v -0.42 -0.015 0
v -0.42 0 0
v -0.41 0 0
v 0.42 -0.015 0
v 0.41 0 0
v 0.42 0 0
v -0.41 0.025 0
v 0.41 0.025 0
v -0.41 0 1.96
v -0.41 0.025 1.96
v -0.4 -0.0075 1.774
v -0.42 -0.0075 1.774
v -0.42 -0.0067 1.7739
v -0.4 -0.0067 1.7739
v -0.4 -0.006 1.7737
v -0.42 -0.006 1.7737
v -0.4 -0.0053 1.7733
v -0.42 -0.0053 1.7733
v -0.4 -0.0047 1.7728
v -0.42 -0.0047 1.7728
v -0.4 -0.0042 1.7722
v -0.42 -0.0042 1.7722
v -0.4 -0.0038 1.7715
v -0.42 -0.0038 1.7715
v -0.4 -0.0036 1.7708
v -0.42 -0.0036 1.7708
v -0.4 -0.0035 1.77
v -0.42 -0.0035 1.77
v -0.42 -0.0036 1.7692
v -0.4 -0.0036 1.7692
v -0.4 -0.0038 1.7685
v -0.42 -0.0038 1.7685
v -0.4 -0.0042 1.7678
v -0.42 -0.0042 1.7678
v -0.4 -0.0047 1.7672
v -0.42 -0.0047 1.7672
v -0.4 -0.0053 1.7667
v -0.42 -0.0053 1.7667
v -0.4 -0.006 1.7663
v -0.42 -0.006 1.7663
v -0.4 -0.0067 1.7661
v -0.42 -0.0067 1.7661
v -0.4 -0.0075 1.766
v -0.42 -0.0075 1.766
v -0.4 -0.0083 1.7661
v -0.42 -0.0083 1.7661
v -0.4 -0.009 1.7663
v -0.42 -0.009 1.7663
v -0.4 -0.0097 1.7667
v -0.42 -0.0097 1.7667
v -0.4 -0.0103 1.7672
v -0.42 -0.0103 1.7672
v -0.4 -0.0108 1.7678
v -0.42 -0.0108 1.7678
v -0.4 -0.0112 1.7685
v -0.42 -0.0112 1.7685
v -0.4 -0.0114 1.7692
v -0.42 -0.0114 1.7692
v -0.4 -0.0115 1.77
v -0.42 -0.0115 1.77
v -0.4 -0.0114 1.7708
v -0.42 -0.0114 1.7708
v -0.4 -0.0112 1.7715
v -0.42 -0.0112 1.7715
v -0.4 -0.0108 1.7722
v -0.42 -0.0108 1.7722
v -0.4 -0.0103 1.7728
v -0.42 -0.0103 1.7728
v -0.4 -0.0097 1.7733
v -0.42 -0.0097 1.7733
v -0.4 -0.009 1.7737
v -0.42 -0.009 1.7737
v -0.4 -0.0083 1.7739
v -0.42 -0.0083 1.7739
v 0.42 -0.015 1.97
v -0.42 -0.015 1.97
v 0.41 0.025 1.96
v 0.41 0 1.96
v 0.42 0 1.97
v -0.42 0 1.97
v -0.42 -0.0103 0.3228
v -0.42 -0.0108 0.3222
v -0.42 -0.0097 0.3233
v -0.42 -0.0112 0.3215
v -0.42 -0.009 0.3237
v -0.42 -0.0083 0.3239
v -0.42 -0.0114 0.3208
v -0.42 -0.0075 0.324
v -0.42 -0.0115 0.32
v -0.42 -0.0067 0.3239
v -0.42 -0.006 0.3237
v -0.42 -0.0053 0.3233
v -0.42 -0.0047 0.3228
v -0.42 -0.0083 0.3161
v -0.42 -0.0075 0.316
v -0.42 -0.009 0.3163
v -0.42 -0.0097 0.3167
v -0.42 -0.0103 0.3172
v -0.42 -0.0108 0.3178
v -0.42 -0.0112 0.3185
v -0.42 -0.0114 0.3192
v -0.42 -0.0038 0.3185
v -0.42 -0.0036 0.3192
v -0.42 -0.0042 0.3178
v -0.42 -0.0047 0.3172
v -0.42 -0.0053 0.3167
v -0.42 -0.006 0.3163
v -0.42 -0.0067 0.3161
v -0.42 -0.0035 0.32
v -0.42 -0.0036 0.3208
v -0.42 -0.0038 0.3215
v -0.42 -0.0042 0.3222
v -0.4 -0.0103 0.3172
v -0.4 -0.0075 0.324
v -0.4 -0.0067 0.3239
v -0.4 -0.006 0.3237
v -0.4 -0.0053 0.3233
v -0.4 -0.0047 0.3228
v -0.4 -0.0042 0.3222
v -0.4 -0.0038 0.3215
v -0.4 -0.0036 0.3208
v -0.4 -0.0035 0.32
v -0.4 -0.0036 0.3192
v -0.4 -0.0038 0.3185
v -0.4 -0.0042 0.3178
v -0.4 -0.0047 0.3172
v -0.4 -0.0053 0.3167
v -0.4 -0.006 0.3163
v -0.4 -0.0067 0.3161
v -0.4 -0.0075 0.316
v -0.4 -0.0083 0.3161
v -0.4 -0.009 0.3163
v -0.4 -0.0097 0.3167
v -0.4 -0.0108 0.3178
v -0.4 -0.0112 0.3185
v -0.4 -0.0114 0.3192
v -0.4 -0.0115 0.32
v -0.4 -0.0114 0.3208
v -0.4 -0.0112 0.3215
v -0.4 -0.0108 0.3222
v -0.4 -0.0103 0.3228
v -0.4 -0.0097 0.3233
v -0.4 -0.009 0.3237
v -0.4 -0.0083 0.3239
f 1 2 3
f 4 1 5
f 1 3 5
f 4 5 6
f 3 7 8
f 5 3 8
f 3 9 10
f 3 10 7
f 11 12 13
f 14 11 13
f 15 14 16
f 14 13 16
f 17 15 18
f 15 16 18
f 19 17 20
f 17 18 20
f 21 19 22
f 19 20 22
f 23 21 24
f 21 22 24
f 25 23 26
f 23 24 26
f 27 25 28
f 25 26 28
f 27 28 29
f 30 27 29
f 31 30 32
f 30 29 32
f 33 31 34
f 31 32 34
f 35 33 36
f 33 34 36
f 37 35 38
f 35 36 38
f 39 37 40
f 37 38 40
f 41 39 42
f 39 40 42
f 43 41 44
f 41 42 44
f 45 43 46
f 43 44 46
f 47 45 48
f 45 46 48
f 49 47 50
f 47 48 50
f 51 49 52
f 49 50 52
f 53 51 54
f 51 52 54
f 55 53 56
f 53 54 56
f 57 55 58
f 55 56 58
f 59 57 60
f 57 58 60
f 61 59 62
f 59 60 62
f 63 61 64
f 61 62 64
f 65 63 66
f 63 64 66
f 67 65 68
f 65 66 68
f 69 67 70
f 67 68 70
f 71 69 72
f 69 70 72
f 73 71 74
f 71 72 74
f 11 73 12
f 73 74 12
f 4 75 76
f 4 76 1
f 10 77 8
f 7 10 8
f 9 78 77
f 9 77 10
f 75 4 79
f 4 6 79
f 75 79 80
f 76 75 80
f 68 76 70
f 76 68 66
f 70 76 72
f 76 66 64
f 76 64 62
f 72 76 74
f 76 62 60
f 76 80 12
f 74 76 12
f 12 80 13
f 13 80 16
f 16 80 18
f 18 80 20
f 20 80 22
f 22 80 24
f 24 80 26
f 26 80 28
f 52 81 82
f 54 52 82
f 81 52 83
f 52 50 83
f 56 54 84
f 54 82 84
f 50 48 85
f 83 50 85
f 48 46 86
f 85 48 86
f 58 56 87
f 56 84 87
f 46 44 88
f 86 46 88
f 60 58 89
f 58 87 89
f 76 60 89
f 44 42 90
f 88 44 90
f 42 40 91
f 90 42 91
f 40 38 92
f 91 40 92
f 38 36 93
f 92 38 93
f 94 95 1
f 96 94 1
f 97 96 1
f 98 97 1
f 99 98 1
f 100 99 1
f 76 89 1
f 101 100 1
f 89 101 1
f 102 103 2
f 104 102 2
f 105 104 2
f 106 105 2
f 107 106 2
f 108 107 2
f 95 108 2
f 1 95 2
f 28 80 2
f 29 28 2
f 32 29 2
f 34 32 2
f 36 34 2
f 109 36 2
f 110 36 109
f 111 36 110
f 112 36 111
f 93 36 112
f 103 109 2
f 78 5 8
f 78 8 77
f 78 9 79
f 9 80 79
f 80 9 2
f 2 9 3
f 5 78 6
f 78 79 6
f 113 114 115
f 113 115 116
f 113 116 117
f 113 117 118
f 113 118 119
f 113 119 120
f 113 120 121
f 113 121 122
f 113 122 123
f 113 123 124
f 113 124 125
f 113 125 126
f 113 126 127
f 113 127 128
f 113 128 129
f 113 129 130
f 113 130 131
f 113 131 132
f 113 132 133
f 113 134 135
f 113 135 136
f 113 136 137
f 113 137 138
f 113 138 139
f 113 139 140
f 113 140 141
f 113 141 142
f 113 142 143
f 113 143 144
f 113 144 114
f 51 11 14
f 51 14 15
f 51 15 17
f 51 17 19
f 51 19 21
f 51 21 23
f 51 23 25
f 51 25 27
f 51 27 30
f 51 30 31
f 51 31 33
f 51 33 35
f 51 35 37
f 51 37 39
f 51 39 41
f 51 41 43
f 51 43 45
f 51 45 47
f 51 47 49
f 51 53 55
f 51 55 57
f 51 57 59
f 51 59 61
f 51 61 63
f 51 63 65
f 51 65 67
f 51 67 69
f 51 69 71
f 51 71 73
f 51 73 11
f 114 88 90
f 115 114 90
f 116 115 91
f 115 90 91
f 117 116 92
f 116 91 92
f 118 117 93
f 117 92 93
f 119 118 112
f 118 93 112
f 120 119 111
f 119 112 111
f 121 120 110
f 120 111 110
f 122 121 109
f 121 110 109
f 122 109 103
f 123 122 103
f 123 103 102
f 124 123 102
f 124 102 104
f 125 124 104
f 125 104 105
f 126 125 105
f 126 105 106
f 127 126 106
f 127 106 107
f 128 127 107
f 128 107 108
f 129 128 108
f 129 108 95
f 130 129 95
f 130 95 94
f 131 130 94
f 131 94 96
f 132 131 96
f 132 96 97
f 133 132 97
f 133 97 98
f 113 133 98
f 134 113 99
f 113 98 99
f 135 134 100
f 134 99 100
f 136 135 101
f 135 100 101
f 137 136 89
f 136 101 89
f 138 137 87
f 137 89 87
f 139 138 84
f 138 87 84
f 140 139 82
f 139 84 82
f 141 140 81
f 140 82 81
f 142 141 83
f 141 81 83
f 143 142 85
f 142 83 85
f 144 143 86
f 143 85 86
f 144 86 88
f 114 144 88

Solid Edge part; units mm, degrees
sketch "Sketch1" plane through (0, 0, 0) normal (0, -1, 0) x (1, 0, 0)
  line L0 (-0.41, 0) -> (0.41, 0)
  line L1 (0.41, 0) -> (0.41, 1.96)
  line L2 (0.41, 1.96) -> (-0.41, 1.96)
  line L3 (-0.41, 1.96) -> (-0.41, 0)
  dimension "D1" = 1.96
  dimension "D2" = 0.82
extrude "Protrusion1" add sketch "Sketch1" against normal blind 0.025
sketch "Sketch2" plane through (0, 0, 0.98) normal (0, -1, 0) x (1, 0, 0)
  line L0 (-0.42, -0.98) -> (0.42, -0.98)
  line L1 (0.42, -0.98) -> (0.42, 0.99)
  line L2 (0.42, 0.99) -> (-0.42, 0.99)
  line L3 (-0.42, 0.99) -> (-0.42, -0.98)
extrude "Ausprägung_2" add sketch "Sketch2" along normal blind 0.015
sketch "Sketch3" plane through (-0.42, -0.0075, 0.985) normal (-1, 0, 0) x (0, 0, 1)
  circle A0 centre (0.785, 0) radius 0.004
  circle A1 centre (-0.665, 0) radius 0.004
  dimension "D1" = 0.008
  dimension "D2" = 0.32
  dimension "D3" = 0.0075
  dimension "D4" = 1.45
extrude "Ausschnitt_1" cut sketch "Sketch3" against normal blind 0.02
extrude "Cutout1" [suppressed]
extrude "Ausprägung_3" [suppressed]
